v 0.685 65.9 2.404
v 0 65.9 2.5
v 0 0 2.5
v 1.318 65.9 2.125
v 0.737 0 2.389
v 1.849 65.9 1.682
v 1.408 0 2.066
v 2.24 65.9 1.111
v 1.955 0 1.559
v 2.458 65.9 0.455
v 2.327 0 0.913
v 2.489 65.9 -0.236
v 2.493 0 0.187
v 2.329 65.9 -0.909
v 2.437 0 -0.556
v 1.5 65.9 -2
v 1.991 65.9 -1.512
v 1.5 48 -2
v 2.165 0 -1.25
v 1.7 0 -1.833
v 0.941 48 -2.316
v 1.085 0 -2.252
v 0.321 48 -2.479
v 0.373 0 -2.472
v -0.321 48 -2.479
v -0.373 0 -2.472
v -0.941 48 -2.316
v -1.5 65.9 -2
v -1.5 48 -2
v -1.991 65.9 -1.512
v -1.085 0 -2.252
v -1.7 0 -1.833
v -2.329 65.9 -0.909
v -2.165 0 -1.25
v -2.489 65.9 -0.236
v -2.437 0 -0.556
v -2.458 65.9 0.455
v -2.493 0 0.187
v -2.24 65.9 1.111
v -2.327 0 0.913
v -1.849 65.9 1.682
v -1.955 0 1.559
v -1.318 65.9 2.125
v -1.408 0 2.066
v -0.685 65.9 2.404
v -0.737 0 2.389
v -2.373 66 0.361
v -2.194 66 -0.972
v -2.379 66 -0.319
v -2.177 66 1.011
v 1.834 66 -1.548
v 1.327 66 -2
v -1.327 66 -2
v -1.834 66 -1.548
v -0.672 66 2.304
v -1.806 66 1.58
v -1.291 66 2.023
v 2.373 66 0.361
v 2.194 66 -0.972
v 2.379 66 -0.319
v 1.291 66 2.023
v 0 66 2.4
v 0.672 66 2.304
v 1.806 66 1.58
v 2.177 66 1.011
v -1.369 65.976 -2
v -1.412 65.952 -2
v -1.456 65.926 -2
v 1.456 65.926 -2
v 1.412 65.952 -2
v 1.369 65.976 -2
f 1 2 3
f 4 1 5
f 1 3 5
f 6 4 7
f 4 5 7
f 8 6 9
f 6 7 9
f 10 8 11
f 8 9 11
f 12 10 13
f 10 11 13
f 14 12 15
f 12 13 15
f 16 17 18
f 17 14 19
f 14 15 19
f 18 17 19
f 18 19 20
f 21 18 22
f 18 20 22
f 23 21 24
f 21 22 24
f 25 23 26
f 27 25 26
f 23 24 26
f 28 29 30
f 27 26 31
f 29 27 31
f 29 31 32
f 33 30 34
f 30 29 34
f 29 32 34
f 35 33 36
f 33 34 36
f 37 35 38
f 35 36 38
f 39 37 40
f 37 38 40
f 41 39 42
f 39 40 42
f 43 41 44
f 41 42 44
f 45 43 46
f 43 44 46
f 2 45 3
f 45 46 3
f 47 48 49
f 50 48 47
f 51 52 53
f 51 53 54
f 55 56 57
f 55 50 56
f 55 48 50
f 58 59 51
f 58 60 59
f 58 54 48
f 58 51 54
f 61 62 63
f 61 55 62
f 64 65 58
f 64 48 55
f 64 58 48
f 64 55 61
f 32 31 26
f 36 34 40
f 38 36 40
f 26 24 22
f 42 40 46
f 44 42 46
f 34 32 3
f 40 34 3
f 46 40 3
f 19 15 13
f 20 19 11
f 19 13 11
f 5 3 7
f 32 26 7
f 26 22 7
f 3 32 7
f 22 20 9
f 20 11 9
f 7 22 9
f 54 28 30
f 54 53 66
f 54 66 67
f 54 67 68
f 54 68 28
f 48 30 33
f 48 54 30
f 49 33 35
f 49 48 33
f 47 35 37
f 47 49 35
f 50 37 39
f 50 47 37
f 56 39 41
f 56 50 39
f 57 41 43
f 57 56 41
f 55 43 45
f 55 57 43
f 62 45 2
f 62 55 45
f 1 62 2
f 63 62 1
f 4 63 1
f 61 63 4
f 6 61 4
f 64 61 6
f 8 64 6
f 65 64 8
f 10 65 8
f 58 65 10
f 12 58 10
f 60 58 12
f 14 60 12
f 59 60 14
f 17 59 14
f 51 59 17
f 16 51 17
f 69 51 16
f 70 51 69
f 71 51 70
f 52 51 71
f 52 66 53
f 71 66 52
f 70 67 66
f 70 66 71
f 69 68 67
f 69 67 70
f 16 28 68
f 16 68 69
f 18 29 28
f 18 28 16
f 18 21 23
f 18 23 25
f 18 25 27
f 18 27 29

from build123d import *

# Parameters (mm, degrees)
SKETCH_1_R          = 2.5
EXTRUDE_1_DEPTH     = 66
CHAMFER_1_SIZE      = 0.1
CUT_EXTRUDE_START   = -18
CUT_EXTRUDE_2_DEPTH = 18


with BuildPart() as part:
    # 草图1 → 凸台-拉伸1 (new body)
    with BuildSketch(Plane(origin=(0, 0, 0), x_dir=(1, 0, 0), z_dir=(0, 1, 0))):
        with Locations(Location((0, 0, 0), (0, 0, 270))):
            Circle(SKETCH_1_R)
    extrude(amount=EXTRUDE_1_DEPTH)

    # 倒角1
    chamfer_1_edges = [part.edges().sort_by_distance(p)[0] for p in [
        (0, 66, -2.5),
    ]]
    chamfer(chamfer_1_edges, length=CHAMFER_1_SIZE)

    # 草图2 → 切除-拉伸2 (cut)
    with BuildSketch(Plane(origin=(0, 66, 0), x_dir=(1, 0, 0), z_dir=(0, 1, 0)).offset(CUT_EXTRUDE_START)):
        with BuildLine():
            Line((-1.5, 2), (1.5, 2))
            ThreePointArc((1.5, 2), (0, 2.5), (-1.5, 2))
        make_face()
    extrude(amount=CUT_EXTRUDE_2_DEPTH, mode=Mode.SUBTRACT)


solid = part.part
